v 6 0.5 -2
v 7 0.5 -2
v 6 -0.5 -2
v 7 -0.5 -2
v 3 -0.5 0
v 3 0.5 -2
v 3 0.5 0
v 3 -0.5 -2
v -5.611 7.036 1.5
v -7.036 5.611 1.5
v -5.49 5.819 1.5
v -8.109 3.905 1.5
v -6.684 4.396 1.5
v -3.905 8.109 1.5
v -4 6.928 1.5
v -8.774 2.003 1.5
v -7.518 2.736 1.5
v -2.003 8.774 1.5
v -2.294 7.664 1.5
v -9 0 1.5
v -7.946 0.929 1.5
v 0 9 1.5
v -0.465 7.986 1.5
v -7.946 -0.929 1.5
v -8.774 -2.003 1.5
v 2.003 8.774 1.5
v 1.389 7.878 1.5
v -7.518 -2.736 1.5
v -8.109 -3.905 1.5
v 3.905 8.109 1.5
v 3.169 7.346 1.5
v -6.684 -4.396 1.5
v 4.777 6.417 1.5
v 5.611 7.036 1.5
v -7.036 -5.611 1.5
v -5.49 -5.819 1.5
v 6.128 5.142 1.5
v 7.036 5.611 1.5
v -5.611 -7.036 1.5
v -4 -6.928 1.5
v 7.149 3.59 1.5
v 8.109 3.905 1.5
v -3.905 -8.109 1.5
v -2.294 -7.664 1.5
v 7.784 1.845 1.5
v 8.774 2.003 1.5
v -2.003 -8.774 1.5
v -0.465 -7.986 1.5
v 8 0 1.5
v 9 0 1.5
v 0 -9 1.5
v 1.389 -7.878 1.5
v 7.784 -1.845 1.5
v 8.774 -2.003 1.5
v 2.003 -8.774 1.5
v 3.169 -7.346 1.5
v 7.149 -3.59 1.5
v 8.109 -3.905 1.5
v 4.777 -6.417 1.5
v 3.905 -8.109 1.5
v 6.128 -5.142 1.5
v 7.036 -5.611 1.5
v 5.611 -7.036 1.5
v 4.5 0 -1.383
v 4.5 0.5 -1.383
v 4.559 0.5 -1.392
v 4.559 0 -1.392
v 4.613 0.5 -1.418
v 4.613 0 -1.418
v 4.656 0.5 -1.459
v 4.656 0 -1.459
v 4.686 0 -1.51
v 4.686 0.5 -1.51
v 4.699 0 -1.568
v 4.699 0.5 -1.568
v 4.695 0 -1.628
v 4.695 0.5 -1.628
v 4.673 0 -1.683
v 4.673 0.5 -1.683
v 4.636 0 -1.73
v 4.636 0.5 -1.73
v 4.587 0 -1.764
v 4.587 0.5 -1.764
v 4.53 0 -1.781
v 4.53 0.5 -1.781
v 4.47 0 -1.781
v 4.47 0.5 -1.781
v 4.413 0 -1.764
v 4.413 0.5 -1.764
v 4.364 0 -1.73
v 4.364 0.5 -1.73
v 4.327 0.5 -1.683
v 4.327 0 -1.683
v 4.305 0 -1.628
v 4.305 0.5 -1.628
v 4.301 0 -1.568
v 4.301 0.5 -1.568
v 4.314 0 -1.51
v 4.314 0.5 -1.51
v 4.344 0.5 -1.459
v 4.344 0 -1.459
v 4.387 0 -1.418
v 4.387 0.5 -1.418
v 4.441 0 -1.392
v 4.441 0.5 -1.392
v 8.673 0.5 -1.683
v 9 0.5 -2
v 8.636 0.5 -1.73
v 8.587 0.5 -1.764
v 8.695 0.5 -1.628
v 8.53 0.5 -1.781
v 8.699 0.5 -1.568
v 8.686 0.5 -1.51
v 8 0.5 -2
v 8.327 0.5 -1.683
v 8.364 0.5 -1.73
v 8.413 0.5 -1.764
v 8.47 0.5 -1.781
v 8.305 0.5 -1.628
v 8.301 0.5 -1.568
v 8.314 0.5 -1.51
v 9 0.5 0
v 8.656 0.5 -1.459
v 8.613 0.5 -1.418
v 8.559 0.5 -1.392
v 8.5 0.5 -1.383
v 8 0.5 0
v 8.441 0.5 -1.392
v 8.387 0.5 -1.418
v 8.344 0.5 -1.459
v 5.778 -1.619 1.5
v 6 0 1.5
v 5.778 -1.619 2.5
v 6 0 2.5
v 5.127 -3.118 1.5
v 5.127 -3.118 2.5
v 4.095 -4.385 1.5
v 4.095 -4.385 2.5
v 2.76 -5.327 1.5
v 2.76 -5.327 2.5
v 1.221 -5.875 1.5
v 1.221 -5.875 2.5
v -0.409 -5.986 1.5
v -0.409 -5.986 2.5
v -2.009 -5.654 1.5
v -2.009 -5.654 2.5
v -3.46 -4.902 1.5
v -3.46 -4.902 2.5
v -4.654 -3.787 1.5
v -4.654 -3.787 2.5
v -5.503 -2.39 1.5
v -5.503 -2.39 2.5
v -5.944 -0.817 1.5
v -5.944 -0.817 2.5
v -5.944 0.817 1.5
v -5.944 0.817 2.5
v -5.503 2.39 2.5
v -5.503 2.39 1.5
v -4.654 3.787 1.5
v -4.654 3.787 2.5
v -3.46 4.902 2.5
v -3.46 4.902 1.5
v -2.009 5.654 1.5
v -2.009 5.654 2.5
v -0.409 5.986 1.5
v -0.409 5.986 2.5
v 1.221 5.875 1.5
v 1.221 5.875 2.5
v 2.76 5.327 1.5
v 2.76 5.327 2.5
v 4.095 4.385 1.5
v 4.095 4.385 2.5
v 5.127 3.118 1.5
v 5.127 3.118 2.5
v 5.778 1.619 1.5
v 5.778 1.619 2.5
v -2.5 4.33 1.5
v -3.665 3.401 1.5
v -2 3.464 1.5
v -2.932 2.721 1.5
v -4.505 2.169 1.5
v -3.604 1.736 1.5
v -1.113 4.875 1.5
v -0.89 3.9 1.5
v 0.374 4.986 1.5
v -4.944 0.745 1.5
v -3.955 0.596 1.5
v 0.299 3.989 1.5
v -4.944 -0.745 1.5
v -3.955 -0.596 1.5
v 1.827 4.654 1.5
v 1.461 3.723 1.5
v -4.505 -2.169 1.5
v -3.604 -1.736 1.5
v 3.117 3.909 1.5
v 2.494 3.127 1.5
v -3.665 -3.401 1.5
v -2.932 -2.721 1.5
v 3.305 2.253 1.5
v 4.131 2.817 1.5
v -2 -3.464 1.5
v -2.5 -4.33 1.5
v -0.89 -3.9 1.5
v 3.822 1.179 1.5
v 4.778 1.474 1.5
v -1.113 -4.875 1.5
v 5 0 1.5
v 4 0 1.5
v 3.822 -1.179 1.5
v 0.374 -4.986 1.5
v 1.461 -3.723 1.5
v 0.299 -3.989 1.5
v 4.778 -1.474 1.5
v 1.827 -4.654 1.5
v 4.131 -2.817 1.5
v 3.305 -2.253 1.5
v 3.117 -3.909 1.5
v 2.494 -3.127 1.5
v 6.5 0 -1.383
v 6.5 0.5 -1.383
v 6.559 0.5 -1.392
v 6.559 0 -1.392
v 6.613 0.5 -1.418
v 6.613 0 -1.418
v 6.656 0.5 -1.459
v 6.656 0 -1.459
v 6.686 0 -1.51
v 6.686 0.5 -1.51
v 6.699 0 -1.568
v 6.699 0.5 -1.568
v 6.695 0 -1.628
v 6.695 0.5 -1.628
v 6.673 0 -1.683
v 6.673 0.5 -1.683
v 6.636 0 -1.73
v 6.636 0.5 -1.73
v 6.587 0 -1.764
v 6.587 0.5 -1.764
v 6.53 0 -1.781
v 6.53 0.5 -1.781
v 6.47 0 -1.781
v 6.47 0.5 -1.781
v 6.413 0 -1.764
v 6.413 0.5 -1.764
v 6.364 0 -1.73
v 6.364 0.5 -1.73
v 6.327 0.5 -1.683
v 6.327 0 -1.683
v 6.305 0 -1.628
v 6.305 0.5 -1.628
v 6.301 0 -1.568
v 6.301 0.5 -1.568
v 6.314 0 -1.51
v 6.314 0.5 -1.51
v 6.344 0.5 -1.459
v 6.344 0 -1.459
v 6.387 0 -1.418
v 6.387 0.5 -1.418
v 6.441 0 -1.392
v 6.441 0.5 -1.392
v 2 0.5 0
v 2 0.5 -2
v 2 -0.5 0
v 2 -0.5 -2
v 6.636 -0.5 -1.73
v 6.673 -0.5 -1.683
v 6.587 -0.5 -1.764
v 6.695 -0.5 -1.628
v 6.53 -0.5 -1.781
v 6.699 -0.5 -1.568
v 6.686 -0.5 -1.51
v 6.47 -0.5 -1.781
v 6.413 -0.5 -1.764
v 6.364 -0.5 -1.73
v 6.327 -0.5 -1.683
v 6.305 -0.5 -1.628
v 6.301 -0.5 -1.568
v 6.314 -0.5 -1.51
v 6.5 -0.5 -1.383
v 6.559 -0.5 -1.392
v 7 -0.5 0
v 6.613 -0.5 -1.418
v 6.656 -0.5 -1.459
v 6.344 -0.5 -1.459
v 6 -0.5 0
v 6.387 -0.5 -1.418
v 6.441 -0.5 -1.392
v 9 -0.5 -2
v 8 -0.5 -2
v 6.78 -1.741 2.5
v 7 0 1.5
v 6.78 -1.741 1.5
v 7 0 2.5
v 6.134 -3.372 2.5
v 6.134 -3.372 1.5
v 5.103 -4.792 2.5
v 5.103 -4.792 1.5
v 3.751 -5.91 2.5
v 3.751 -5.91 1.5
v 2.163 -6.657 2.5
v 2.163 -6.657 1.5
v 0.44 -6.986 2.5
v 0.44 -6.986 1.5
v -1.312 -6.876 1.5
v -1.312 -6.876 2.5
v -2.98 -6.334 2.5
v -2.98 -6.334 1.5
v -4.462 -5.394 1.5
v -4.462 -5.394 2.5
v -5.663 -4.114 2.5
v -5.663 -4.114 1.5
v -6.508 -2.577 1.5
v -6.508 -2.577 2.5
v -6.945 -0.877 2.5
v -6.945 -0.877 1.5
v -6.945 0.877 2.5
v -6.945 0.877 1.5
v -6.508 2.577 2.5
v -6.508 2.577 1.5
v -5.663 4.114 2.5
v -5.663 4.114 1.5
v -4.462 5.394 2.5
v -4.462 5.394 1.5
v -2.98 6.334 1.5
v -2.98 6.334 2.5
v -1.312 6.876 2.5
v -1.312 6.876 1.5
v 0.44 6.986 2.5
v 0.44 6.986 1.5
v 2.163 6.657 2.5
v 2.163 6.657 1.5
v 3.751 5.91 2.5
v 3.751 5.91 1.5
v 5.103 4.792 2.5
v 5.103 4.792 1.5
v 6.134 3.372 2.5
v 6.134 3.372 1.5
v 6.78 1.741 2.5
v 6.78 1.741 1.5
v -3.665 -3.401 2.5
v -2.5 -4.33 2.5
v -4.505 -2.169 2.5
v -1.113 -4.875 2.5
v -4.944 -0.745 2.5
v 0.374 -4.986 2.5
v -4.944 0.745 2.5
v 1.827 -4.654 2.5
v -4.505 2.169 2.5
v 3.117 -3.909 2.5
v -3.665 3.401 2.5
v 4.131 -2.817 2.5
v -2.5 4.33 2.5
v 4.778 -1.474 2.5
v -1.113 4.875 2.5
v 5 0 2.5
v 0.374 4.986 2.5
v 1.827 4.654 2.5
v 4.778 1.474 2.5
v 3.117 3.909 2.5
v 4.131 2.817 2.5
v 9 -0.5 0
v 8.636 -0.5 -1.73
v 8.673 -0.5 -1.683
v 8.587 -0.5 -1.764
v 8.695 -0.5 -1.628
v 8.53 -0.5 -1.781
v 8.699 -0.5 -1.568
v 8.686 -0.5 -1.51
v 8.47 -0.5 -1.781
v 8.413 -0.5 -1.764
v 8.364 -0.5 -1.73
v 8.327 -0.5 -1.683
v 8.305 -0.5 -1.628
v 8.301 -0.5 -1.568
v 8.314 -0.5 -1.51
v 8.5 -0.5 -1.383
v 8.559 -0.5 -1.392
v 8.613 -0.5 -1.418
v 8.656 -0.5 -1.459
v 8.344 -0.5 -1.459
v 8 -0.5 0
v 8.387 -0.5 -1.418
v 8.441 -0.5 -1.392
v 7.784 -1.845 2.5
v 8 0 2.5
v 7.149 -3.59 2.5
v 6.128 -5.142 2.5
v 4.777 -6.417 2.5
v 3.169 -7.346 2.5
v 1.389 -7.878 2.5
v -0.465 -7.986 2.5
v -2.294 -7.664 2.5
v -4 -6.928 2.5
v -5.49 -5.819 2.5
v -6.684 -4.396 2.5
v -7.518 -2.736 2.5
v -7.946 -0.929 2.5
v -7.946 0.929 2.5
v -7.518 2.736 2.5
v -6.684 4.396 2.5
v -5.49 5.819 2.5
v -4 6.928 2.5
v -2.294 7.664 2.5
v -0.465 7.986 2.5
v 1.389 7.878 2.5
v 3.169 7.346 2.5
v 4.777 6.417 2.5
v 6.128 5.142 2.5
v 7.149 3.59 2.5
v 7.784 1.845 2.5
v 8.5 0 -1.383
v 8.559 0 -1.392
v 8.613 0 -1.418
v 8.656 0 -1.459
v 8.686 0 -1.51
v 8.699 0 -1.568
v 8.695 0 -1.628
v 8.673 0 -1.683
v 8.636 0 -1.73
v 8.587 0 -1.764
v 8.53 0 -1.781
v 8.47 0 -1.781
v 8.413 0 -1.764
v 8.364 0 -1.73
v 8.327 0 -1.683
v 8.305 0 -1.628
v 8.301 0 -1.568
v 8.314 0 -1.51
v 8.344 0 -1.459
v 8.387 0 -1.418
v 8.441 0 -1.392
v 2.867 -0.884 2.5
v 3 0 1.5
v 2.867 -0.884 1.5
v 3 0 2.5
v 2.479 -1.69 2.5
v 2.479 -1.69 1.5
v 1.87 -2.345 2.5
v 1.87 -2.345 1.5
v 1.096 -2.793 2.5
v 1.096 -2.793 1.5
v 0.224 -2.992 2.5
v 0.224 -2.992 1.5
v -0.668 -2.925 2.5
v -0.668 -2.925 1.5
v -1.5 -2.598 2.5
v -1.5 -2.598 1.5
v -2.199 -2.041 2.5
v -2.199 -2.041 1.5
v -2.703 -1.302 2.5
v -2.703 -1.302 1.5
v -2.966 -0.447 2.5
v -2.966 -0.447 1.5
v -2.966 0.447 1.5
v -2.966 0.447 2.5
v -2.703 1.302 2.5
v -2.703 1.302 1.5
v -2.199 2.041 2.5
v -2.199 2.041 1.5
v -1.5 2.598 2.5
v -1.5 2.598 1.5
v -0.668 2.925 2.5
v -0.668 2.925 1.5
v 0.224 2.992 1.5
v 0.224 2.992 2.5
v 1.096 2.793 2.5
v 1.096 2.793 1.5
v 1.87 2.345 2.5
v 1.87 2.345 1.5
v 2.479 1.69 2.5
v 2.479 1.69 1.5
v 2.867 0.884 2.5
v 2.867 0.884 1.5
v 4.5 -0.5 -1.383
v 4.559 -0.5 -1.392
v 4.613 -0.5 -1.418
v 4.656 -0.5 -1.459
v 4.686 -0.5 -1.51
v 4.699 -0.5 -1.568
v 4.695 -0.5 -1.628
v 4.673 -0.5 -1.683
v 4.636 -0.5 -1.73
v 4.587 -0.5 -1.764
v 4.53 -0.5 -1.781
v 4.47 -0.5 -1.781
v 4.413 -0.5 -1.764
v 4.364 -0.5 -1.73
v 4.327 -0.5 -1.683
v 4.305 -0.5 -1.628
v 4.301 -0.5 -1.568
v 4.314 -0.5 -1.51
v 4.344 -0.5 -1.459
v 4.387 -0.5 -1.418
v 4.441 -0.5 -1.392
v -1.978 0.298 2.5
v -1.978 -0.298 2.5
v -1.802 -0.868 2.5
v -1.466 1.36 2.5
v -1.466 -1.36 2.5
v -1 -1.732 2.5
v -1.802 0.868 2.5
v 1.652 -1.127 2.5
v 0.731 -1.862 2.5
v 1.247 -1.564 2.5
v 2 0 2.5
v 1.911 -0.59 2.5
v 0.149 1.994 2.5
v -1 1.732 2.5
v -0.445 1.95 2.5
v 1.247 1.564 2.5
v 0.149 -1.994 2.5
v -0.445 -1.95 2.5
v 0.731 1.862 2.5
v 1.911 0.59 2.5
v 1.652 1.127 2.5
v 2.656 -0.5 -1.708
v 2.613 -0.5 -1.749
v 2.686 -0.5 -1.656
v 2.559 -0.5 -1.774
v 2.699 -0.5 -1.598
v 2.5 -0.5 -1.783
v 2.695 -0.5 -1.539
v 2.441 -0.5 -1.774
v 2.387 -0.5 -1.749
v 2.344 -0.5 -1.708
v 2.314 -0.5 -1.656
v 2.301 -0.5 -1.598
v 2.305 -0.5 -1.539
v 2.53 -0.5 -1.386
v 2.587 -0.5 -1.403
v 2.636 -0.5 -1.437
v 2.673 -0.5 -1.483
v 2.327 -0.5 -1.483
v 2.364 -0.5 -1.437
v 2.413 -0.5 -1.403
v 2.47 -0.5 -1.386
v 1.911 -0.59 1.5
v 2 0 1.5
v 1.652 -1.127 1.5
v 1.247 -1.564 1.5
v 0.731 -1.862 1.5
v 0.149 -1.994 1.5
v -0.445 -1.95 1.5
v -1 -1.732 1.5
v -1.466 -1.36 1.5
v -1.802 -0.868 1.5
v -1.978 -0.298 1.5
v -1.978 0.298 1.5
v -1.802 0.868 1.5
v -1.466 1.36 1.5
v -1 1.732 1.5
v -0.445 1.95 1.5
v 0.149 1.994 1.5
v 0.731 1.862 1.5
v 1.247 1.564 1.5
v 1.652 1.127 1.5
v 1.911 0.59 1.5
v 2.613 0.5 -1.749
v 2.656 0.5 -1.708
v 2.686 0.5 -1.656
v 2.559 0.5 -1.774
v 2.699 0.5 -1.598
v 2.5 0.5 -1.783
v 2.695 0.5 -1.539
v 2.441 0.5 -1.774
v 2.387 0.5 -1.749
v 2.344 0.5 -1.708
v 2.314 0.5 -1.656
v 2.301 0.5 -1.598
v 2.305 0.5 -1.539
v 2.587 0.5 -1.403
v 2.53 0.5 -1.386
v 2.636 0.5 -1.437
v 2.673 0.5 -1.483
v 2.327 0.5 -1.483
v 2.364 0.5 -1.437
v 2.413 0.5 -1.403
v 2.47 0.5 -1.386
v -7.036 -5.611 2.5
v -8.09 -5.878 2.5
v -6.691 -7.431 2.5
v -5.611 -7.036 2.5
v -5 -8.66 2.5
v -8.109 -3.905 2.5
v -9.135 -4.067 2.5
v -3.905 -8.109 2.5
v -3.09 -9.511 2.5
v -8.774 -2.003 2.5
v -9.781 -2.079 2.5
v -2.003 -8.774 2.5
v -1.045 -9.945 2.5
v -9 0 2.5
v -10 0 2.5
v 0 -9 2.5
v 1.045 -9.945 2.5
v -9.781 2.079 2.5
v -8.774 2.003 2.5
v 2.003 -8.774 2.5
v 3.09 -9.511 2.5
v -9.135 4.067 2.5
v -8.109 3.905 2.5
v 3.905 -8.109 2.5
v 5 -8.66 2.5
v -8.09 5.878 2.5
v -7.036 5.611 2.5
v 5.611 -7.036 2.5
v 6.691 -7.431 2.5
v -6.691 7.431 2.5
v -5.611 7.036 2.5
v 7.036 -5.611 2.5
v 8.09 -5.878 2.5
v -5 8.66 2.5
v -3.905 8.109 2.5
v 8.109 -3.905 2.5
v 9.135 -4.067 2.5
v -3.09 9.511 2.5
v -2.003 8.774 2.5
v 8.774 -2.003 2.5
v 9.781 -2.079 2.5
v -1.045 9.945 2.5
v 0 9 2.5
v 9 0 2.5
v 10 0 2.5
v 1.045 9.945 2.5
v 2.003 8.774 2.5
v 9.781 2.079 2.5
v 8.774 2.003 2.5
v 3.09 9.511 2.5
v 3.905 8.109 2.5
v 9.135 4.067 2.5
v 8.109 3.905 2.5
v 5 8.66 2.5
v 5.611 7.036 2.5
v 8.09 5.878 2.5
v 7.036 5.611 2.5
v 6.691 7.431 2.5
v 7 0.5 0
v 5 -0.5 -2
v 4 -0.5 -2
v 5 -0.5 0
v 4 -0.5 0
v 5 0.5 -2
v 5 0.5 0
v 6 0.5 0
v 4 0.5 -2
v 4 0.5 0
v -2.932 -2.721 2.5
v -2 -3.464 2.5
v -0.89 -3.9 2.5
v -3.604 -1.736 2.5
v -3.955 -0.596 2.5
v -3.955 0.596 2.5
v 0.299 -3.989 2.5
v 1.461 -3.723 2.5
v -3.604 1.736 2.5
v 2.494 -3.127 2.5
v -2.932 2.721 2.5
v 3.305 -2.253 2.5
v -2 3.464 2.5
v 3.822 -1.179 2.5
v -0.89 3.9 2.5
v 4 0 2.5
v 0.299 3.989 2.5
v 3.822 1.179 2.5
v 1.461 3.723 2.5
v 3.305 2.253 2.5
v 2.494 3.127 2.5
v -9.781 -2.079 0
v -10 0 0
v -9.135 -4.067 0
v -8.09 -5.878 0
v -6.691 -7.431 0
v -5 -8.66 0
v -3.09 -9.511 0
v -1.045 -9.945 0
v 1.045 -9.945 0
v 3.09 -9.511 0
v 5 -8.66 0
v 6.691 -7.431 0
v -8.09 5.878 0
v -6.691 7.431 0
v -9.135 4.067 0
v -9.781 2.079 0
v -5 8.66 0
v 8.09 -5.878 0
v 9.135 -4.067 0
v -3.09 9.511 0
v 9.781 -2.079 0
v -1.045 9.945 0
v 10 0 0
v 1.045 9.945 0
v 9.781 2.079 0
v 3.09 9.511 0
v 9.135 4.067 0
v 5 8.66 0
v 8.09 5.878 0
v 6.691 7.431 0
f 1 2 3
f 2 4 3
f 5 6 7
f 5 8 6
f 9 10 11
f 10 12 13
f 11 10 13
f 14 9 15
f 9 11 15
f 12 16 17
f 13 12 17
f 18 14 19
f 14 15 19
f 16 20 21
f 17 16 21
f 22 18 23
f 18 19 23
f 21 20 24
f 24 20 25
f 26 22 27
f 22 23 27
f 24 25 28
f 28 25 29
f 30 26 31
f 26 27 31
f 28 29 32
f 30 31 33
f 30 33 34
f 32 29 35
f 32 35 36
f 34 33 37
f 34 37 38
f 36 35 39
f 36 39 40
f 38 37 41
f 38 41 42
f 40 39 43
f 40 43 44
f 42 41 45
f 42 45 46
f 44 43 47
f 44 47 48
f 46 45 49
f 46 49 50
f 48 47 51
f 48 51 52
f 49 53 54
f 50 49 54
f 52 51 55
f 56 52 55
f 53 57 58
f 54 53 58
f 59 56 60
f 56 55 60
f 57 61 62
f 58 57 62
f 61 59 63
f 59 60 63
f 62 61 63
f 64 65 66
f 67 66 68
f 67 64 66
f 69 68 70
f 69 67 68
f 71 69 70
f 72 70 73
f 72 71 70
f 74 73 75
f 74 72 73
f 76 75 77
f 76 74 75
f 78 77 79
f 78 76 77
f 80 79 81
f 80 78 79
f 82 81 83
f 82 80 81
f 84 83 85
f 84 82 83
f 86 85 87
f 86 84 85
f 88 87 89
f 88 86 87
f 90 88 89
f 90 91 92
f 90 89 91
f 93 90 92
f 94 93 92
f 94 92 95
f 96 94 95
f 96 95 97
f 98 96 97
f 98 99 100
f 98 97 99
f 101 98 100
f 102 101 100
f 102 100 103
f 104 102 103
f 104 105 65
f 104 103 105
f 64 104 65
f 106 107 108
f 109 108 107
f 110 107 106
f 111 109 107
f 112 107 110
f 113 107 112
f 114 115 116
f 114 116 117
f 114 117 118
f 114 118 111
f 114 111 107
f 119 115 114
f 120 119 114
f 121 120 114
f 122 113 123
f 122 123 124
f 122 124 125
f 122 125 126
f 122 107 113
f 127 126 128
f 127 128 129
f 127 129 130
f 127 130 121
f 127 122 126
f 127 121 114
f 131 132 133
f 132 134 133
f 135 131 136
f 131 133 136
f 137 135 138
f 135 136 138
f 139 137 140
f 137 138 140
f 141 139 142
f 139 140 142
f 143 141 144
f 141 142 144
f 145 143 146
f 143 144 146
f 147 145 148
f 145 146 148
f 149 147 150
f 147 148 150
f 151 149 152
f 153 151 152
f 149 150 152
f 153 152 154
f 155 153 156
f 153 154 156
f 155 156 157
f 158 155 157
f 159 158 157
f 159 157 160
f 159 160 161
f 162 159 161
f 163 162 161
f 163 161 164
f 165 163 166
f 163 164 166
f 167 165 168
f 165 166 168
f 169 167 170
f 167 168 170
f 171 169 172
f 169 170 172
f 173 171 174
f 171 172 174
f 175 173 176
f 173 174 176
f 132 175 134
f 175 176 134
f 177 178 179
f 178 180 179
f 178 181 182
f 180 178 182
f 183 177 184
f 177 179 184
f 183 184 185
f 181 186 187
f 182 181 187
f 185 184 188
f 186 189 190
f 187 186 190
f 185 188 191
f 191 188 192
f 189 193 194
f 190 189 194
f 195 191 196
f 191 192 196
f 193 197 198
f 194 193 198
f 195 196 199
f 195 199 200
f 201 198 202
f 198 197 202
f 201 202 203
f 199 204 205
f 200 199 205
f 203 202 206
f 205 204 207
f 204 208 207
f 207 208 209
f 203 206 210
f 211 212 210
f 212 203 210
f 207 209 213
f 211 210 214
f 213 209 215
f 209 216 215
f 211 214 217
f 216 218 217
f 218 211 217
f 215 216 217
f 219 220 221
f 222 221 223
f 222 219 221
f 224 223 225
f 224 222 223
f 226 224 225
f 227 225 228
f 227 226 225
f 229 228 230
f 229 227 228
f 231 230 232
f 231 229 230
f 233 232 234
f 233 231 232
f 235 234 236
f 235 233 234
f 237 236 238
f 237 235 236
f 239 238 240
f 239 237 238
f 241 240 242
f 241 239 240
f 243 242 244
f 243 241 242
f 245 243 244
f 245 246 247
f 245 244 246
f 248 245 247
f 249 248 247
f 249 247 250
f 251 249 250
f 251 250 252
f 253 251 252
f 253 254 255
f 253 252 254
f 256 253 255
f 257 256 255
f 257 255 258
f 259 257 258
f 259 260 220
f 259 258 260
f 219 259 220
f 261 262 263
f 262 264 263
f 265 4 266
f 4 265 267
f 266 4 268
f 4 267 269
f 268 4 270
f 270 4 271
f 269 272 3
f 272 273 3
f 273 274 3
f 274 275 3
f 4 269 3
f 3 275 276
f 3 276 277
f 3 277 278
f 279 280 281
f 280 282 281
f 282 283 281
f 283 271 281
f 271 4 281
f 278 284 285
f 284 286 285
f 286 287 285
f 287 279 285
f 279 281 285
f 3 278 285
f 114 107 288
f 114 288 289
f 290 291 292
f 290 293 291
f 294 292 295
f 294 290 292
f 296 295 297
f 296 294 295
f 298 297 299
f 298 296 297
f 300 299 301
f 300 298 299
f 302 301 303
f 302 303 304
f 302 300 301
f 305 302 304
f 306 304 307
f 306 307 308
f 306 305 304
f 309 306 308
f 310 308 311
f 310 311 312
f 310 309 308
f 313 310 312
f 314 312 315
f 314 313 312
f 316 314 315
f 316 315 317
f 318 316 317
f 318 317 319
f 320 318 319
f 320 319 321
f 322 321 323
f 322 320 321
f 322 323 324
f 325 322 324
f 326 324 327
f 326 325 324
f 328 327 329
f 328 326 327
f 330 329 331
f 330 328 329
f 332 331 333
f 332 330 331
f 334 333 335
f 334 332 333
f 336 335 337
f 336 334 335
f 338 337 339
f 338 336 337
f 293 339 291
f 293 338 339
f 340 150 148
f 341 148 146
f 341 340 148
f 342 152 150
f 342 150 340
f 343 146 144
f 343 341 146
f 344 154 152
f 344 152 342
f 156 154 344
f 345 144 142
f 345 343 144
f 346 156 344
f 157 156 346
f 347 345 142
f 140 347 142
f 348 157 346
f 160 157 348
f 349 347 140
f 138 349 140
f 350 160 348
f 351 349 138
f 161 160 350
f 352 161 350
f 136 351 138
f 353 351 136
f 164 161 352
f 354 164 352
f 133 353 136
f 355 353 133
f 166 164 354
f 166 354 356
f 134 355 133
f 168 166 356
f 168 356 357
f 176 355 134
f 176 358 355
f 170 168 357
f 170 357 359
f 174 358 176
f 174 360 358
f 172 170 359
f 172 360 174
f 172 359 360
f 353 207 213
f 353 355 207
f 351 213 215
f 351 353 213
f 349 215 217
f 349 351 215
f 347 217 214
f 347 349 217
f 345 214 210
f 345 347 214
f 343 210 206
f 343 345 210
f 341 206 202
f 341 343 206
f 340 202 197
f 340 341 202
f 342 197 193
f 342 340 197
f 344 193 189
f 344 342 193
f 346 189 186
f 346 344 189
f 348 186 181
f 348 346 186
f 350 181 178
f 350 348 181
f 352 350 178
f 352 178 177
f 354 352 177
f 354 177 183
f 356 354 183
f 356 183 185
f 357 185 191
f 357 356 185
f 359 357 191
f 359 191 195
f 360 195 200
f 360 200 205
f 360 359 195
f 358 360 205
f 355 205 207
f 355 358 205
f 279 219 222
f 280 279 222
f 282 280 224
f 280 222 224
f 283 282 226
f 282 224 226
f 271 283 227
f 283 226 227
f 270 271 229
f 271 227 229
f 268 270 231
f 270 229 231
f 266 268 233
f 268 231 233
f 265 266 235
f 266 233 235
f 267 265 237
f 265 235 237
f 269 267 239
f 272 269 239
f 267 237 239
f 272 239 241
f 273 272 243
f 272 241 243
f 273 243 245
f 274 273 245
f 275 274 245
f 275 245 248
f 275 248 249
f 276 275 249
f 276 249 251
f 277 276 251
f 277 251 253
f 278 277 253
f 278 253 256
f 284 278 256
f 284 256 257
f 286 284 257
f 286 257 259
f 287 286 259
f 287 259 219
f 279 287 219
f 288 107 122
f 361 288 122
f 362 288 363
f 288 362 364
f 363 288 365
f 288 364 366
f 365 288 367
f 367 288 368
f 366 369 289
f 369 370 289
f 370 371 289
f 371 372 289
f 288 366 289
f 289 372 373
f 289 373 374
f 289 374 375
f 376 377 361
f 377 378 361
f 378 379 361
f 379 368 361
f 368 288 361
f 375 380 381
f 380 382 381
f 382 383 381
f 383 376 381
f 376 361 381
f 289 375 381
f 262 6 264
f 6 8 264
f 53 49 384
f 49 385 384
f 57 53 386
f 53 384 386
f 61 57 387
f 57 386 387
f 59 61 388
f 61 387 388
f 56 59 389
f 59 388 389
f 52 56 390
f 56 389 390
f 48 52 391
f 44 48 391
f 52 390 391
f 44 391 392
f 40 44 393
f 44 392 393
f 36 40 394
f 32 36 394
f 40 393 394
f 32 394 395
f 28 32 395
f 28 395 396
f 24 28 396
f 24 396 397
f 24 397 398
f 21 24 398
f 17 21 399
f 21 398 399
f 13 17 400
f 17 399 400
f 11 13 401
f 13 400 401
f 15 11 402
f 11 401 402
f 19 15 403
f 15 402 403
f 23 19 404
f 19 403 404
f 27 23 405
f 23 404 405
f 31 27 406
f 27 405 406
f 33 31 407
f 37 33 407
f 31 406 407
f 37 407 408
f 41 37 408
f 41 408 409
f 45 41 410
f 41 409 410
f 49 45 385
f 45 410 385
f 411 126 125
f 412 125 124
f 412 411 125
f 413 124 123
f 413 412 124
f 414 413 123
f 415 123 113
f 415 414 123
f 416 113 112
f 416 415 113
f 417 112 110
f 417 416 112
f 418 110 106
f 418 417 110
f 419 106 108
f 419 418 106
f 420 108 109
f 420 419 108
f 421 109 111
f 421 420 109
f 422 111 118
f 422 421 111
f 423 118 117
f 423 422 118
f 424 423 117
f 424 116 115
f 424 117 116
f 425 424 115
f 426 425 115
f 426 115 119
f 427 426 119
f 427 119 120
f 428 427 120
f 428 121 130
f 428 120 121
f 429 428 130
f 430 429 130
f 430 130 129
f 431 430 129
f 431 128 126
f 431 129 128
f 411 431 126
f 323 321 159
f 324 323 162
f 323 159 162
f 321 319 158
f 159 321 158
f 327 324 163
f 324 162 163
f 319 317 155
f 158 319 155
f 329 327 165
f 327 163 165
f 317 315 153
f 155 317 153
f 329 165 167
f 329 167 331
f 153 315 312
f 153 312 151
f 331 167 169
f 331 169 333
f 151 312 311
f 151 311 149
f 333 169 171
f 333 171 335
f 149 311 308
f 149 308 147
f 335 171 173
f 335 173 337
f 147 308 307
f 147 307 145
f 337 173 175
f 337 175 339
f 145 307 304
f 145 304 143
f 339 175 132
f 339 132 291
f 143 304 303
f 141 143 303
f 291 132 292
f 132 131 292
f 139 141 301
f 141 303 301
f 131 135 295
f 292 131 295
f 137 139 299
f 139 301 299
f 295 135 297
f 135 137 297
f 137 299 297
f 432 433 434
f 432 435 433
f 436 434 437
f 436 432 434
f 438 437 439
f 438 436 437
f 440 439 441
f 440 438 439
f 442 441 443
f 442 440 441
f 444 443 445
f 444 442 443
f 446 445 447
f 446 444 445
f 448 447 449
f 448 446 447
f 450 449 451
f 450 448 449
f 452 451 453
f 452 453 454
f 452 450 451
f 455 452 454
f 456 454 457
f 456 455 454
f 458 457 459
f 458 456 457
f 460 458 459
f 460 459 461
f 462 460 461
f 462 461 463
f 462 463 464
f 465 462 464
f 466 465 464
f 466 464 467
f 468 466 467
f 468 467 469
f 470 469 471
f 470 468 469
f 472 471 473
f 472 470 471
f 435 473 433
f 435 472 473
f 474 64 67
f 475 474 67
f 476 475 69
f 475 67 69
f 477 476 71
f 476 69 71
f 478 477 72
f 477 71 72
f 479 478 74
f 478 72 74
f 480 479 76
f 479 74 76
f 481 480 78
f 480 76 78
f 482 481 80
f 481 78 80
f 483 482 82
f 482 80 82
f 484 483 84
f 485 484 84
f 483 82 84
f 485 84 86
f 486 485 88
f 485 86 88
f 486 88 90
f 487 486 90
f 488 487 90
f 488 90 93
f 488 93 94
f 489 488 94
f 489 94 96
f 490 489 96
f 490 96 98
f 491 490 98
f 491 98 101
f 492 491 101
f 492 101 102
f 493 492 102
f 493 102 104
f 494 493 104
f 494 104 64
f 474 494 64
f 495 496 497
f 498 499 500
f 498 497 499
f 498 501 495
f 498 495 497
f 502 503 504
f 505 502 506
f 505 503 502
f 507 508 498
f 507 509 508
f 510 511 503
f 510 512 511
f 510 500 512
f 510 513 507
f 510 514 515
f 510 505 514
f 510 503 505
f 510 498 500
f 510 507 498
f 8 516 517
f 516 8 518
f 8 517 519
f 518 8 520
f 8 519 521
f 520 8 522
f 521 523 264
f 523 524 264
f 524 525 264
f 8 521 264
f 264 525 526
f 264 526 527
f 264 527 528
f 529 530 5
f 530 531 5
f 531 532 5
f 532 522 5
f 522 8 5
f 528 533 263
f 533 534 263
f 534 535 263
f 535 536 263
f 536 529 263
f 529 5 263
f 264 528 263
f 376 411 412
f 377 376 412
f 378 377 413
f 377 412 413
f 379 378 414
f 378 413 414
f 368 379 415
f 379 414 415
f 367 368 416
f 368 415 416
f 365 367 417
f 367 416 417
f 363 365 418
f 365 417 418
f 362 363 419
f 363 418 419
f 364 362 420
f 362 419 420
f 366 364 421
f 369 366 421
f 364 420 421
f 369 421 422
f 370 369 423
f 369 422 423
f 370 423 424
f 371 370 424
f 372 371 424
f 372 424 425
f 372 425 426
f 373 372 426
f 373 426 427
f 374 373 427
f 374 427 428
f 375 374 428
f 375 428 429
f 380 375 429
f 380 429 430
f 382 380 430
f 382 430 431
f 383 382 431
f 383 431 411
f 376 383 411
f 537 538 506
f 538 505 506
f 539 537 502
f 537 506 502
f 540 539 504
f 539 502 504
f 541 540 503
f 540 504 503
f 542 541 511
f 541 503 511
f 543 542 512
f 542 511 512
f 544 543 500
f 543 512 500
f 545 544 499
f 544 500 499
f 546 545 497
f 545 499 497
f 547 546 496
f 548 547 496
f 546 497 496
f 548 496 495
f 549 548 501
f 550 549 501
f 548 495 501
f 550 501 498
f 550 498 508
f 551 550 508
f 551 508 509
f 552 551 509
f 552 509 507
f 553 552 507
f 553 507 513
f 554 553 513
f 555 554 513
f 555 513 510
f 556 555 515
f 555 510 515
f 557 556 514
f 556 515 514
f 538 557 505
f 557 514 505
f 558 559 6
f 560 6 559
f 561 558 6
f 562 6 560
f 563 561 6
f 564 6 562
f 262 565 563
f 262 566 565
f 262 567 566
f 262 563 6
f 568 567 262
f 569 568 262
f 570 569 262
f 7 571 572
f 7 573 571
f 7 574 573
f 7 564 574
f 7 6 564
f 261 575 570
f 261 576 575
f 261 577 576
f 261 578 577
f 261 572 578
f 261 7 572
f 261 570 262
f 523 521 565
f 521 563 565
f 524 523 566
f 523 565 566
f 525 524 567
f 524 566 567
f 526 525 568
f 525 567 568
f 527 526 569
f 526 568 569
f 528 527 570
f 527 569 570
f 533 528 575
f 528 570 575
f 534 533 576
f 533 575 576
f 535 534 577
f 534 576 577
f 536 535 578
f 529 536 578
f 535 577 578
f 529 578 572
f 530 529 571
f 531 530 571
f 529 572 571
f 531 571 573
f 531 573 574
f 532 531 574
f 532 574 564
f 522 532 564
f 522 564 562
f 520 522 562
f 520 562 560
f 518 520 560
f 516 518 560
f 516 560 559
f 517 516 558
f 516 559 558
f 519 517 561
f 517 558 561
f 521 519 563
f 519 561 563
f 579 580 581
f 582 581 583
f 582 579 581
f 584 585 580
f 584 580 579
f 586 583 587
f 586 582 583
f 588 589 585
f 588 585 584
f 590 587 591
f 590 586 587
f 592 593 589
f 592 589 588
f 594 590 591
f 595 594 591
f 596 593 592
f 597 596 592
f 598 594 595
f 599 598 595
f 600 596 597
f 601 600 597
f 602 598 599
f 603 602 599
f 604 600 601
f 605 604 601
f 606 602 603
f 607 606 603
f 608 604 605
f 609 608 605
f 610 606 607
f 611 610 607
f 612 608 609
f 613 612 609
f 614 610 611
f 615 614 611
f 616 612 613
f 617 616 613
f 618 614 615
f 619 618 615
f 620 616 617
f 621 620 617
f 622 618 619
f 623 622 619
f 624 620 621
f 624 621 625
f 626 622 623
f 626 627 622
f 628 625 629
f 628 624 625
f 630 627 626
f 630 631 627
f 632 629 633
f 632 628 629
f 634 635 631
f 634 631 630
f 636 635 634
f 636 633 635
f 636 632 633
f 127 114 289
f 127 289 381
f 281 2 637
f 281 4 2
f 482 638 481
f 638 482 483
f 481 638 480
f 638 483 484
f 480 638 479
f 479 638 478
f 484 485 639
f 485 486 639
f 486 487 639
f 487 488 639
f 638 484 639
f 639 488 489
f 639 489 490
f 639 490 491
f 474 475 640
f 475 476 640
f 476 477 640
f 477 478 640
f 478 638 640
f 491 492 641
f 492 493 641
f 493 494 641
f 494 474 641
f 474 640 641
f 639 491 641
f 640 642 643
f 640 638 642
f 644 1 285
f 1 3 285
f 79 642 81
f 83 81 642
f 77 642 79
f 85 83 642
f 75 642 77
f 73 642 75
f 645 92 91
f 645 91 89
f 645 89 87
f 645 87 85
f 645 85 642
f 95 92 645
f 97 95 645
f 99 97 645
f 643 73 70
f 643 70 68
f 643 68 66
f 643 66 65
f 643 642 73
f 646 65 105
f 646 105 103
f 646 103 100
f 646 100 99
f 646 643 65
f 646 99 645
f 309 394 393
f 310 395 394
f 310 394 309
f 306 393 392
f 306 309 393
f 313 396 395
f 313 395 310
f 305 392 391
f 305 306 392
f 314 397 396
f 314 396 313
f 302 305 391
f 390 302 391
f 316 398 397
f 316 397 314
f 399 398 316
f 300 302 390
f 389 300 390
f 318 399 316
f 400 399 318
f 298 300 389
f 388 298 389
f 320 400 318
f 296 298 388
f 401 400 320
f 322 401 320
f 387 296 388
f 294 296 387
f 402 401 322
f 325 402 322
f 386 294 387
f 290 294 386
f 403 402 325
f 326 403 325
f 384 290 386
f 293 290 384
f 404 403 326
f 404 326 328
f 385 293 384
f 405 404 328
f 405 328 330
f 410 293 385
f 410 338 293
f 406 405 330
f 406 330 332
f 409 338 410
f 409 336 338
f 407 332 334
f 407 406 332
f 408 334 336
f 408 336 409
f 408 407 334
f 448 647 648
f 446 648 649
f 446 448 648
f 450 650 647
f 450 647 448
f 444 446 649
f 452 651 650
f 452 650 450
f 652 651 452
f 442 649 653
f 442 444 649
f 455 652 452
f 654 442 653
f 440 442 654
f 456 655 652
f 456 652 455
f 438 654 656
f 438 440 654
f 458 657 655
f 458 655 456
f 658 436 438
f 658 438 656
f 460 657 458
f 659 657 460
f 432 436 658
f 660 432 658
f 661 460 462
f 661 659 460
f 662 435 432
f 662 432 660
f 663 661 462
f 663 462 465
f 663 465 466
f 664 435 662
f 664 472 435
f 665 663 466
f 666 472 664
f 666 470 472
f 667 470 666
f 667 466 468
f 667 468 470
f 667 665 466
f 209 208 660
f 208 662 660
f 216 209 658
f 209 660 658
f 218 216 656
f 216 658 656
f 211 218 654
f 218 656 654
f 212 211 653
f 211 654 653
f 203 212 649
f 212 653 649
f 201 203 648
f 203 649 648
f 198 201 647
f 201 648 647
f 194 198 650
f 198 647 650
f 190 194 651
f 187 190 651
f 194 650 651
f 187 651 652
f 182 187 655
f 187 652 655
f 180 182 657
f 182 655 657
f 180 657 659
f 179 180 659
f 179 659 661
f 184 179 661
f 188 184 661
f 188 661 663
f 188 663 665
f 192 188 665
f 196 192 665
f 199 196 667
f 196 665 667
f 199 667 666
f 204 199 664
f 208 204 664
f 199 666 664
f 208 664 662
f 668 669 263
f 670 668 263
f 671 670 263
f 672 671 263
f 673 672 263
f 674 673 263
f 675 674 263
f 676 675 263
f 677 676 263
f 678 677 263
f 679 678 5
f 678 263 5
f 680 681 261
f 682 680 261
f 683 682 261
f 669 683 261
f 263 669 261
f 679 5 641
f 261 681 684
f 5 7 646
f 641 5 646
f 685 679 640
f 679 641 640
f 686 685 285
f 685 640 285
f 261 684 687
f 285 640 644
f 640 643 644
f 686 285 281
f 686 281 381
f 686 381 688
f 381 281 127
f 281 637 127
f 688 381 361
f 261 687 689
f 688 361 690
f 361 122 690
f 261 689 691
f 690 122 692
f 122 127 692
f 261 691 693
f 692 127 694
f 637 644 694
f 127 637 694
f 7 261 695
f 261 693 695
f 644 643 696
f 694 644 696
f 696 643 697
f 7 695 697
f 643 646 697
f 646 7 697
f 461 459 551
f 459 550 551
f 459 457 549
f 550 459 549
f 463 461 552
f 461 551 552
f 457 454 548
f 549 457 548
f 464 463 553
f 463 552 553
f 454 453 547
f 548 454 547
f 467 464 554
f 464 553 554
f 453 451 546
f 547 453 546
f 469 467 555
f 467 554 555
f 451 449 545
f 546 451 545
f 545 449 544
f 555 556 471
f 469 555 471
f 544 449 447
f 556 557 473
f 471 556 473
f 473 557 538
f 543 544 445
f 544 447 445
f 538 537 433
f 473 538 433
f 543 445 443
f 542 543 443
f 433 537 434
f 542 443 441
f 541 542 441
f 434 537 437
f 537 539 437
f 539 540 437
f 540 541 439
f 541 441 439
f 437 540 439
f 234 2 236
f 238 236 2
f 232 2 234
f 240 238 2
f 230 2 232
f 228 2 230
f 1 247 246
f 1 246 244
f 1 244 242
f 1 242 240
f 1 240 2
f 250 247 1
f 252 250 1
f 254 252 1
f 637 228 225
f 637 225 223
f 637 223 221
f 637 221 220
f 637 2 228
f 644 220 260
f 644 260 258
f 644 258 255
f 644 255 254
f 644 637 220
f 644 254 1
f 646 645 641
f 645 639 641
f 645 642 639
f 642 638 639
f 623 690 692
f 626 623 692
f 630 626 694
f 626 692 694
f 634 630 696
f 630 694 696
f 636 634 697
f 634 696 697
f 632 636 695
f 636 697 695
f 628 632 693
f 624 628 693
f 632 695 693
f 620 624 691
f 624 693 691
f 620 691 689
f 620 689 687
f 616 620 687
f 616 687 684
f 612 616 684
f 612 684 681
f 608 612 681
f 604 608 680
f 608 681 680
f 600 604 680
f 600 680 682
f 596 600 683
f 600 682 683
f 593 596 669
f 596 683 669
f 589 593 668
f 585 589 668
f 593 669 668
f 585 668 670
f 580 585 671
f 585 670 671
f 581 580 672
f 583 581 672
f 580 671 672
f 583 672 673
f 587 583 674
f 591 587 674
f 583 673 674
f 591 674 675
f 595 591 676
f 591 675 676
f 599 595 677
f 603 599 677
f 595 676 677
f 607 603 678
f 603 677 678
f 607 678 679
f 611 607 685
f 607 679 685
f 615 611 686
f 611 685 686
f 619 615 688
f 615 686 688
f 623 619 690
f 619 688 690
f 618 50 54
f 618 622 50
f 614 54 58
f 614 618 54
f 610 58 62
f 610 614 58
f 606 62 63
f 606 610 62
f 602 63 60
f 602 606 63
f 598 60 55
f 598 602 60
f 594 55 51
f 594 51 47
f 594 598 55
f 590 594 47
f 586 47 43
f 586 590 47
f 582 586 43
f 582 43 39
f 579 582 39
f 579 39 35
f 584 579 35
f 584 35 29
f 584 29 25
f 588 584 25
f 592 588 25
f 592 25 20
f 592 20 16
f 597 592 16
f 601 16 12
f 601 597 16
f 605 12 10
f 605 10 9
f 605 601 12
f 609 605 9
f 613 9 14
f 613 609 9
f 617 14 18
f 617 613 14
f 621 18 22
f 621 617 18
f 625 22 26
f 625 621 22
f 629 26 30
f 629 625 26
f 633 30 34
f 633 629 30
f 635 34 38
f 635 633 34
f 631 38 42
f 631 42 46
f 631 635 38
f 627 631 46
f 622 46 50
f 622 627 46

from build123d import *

# Parameters (mm, degrees)
SKETCH1_R           = 10
BOSS_EXTRUDE1_DEPTH = 2.5
SKETCH5_W           = 1
SKETCH5_H           = 1
SKETCH6_W           = 1
SKETCH6_H           = 2
BOSS_EXTRUDE2_DEPTH = 0.5
SKETCH7_R           = 0.2
CUT_EXTRUDE1_DEPTH  = 1.5


with BuildPart() as part:
    # Sketch1 → Boss-Extrude1 (new body)
    with BuildSketch(Plane(origin=(0, 0, 0), x_dir=(0, 1, 0), z_dir=(0, 0, 1))):
        with Locations(Location((0, 0, 0), (0, 0, 270))):
            Circle(SKETCH1_R)
    extrude(amount=BOSS_EXTRUDE1_DEPTH)

    # Sketch5 → Cut-Revolve1 (revolve, cut)
    with BuildSketch(Plane(origin=(0, 0, 0), x_dir=(-1, 0, 0), z_dir=(0, 1, 0))):
        with Locations((-4.5, 2)):
            Rectangle(SKETCH5_W, SKETCH5_H)
        with Locations((-2.5, 2)):
            Rectangle(SKETCH5_W, SKETCH5_H)
        with Locations((-6.5, 2)):
            Rectangle(SKETCH5_W, SKETCH5_H)
        with Locations((-8.5, 2)):
            Rectangle(SKETCH5_W, SKETCH5_H)
    revolve(axis=Axis((0, 0, 2.5), (0, 0, -1)), mode=Mode.SUBTRACT)

    # Sketch6 → Boss-Extrude2 (add, symmetric)
    with BuildSketch(Plane(origin=(0, 0, 0), x_dir=(-1, 0, 0), z_dir=(0, 1, 0))):
        with Locations((-2.5, -1)):
            Rectangle(SKETCH6_W, SKETCH6_H)
        with Locations((-4.5, -1)):
            Rectangle(SKETCH6_W, SKETCH6_H)
        with Locations((-6.5, -1)):
            Rectangle(SKETCH6_W, SKETCH6_H)
        with Locations((-8.5, -1)):
            Rectangle(SKETCH6_W, SKETCH6_H)
    extrude(amount=BOSS_EXTRUDE2_DEPTH, both=True)

    # Sketch7 → Cut-Extrude1 (cut, symmetric)
    with BuildSketch(Plane(origin=(0, 0, 0), x_dir=(-1, 0, 0), z_dir=(0, 1, 0))):
        with Locations(Location((-8.5, -1.583373246, 0), (0, 0, 90))):
            Circle(SKETCH7_R)
        with Locations(Location((-6.5, -1.583373246, 0), (0, 0, 90))):
            Circle(SKETCH7_R)
        with Locations(Location((-4.5, -1.583373246, 0), (0, 0, 90))):
            Circle(SKETCH7_R)
        with Locations(Location((-2.5, -1.583373246, 0), (0, 0, 270))):
            Circle(SKETCH7_R)
    extrude(amount=CUT_EXTRUDE1_DEPTH, both=True, mode=Mode.SUBTRACT)


solid = part.part
